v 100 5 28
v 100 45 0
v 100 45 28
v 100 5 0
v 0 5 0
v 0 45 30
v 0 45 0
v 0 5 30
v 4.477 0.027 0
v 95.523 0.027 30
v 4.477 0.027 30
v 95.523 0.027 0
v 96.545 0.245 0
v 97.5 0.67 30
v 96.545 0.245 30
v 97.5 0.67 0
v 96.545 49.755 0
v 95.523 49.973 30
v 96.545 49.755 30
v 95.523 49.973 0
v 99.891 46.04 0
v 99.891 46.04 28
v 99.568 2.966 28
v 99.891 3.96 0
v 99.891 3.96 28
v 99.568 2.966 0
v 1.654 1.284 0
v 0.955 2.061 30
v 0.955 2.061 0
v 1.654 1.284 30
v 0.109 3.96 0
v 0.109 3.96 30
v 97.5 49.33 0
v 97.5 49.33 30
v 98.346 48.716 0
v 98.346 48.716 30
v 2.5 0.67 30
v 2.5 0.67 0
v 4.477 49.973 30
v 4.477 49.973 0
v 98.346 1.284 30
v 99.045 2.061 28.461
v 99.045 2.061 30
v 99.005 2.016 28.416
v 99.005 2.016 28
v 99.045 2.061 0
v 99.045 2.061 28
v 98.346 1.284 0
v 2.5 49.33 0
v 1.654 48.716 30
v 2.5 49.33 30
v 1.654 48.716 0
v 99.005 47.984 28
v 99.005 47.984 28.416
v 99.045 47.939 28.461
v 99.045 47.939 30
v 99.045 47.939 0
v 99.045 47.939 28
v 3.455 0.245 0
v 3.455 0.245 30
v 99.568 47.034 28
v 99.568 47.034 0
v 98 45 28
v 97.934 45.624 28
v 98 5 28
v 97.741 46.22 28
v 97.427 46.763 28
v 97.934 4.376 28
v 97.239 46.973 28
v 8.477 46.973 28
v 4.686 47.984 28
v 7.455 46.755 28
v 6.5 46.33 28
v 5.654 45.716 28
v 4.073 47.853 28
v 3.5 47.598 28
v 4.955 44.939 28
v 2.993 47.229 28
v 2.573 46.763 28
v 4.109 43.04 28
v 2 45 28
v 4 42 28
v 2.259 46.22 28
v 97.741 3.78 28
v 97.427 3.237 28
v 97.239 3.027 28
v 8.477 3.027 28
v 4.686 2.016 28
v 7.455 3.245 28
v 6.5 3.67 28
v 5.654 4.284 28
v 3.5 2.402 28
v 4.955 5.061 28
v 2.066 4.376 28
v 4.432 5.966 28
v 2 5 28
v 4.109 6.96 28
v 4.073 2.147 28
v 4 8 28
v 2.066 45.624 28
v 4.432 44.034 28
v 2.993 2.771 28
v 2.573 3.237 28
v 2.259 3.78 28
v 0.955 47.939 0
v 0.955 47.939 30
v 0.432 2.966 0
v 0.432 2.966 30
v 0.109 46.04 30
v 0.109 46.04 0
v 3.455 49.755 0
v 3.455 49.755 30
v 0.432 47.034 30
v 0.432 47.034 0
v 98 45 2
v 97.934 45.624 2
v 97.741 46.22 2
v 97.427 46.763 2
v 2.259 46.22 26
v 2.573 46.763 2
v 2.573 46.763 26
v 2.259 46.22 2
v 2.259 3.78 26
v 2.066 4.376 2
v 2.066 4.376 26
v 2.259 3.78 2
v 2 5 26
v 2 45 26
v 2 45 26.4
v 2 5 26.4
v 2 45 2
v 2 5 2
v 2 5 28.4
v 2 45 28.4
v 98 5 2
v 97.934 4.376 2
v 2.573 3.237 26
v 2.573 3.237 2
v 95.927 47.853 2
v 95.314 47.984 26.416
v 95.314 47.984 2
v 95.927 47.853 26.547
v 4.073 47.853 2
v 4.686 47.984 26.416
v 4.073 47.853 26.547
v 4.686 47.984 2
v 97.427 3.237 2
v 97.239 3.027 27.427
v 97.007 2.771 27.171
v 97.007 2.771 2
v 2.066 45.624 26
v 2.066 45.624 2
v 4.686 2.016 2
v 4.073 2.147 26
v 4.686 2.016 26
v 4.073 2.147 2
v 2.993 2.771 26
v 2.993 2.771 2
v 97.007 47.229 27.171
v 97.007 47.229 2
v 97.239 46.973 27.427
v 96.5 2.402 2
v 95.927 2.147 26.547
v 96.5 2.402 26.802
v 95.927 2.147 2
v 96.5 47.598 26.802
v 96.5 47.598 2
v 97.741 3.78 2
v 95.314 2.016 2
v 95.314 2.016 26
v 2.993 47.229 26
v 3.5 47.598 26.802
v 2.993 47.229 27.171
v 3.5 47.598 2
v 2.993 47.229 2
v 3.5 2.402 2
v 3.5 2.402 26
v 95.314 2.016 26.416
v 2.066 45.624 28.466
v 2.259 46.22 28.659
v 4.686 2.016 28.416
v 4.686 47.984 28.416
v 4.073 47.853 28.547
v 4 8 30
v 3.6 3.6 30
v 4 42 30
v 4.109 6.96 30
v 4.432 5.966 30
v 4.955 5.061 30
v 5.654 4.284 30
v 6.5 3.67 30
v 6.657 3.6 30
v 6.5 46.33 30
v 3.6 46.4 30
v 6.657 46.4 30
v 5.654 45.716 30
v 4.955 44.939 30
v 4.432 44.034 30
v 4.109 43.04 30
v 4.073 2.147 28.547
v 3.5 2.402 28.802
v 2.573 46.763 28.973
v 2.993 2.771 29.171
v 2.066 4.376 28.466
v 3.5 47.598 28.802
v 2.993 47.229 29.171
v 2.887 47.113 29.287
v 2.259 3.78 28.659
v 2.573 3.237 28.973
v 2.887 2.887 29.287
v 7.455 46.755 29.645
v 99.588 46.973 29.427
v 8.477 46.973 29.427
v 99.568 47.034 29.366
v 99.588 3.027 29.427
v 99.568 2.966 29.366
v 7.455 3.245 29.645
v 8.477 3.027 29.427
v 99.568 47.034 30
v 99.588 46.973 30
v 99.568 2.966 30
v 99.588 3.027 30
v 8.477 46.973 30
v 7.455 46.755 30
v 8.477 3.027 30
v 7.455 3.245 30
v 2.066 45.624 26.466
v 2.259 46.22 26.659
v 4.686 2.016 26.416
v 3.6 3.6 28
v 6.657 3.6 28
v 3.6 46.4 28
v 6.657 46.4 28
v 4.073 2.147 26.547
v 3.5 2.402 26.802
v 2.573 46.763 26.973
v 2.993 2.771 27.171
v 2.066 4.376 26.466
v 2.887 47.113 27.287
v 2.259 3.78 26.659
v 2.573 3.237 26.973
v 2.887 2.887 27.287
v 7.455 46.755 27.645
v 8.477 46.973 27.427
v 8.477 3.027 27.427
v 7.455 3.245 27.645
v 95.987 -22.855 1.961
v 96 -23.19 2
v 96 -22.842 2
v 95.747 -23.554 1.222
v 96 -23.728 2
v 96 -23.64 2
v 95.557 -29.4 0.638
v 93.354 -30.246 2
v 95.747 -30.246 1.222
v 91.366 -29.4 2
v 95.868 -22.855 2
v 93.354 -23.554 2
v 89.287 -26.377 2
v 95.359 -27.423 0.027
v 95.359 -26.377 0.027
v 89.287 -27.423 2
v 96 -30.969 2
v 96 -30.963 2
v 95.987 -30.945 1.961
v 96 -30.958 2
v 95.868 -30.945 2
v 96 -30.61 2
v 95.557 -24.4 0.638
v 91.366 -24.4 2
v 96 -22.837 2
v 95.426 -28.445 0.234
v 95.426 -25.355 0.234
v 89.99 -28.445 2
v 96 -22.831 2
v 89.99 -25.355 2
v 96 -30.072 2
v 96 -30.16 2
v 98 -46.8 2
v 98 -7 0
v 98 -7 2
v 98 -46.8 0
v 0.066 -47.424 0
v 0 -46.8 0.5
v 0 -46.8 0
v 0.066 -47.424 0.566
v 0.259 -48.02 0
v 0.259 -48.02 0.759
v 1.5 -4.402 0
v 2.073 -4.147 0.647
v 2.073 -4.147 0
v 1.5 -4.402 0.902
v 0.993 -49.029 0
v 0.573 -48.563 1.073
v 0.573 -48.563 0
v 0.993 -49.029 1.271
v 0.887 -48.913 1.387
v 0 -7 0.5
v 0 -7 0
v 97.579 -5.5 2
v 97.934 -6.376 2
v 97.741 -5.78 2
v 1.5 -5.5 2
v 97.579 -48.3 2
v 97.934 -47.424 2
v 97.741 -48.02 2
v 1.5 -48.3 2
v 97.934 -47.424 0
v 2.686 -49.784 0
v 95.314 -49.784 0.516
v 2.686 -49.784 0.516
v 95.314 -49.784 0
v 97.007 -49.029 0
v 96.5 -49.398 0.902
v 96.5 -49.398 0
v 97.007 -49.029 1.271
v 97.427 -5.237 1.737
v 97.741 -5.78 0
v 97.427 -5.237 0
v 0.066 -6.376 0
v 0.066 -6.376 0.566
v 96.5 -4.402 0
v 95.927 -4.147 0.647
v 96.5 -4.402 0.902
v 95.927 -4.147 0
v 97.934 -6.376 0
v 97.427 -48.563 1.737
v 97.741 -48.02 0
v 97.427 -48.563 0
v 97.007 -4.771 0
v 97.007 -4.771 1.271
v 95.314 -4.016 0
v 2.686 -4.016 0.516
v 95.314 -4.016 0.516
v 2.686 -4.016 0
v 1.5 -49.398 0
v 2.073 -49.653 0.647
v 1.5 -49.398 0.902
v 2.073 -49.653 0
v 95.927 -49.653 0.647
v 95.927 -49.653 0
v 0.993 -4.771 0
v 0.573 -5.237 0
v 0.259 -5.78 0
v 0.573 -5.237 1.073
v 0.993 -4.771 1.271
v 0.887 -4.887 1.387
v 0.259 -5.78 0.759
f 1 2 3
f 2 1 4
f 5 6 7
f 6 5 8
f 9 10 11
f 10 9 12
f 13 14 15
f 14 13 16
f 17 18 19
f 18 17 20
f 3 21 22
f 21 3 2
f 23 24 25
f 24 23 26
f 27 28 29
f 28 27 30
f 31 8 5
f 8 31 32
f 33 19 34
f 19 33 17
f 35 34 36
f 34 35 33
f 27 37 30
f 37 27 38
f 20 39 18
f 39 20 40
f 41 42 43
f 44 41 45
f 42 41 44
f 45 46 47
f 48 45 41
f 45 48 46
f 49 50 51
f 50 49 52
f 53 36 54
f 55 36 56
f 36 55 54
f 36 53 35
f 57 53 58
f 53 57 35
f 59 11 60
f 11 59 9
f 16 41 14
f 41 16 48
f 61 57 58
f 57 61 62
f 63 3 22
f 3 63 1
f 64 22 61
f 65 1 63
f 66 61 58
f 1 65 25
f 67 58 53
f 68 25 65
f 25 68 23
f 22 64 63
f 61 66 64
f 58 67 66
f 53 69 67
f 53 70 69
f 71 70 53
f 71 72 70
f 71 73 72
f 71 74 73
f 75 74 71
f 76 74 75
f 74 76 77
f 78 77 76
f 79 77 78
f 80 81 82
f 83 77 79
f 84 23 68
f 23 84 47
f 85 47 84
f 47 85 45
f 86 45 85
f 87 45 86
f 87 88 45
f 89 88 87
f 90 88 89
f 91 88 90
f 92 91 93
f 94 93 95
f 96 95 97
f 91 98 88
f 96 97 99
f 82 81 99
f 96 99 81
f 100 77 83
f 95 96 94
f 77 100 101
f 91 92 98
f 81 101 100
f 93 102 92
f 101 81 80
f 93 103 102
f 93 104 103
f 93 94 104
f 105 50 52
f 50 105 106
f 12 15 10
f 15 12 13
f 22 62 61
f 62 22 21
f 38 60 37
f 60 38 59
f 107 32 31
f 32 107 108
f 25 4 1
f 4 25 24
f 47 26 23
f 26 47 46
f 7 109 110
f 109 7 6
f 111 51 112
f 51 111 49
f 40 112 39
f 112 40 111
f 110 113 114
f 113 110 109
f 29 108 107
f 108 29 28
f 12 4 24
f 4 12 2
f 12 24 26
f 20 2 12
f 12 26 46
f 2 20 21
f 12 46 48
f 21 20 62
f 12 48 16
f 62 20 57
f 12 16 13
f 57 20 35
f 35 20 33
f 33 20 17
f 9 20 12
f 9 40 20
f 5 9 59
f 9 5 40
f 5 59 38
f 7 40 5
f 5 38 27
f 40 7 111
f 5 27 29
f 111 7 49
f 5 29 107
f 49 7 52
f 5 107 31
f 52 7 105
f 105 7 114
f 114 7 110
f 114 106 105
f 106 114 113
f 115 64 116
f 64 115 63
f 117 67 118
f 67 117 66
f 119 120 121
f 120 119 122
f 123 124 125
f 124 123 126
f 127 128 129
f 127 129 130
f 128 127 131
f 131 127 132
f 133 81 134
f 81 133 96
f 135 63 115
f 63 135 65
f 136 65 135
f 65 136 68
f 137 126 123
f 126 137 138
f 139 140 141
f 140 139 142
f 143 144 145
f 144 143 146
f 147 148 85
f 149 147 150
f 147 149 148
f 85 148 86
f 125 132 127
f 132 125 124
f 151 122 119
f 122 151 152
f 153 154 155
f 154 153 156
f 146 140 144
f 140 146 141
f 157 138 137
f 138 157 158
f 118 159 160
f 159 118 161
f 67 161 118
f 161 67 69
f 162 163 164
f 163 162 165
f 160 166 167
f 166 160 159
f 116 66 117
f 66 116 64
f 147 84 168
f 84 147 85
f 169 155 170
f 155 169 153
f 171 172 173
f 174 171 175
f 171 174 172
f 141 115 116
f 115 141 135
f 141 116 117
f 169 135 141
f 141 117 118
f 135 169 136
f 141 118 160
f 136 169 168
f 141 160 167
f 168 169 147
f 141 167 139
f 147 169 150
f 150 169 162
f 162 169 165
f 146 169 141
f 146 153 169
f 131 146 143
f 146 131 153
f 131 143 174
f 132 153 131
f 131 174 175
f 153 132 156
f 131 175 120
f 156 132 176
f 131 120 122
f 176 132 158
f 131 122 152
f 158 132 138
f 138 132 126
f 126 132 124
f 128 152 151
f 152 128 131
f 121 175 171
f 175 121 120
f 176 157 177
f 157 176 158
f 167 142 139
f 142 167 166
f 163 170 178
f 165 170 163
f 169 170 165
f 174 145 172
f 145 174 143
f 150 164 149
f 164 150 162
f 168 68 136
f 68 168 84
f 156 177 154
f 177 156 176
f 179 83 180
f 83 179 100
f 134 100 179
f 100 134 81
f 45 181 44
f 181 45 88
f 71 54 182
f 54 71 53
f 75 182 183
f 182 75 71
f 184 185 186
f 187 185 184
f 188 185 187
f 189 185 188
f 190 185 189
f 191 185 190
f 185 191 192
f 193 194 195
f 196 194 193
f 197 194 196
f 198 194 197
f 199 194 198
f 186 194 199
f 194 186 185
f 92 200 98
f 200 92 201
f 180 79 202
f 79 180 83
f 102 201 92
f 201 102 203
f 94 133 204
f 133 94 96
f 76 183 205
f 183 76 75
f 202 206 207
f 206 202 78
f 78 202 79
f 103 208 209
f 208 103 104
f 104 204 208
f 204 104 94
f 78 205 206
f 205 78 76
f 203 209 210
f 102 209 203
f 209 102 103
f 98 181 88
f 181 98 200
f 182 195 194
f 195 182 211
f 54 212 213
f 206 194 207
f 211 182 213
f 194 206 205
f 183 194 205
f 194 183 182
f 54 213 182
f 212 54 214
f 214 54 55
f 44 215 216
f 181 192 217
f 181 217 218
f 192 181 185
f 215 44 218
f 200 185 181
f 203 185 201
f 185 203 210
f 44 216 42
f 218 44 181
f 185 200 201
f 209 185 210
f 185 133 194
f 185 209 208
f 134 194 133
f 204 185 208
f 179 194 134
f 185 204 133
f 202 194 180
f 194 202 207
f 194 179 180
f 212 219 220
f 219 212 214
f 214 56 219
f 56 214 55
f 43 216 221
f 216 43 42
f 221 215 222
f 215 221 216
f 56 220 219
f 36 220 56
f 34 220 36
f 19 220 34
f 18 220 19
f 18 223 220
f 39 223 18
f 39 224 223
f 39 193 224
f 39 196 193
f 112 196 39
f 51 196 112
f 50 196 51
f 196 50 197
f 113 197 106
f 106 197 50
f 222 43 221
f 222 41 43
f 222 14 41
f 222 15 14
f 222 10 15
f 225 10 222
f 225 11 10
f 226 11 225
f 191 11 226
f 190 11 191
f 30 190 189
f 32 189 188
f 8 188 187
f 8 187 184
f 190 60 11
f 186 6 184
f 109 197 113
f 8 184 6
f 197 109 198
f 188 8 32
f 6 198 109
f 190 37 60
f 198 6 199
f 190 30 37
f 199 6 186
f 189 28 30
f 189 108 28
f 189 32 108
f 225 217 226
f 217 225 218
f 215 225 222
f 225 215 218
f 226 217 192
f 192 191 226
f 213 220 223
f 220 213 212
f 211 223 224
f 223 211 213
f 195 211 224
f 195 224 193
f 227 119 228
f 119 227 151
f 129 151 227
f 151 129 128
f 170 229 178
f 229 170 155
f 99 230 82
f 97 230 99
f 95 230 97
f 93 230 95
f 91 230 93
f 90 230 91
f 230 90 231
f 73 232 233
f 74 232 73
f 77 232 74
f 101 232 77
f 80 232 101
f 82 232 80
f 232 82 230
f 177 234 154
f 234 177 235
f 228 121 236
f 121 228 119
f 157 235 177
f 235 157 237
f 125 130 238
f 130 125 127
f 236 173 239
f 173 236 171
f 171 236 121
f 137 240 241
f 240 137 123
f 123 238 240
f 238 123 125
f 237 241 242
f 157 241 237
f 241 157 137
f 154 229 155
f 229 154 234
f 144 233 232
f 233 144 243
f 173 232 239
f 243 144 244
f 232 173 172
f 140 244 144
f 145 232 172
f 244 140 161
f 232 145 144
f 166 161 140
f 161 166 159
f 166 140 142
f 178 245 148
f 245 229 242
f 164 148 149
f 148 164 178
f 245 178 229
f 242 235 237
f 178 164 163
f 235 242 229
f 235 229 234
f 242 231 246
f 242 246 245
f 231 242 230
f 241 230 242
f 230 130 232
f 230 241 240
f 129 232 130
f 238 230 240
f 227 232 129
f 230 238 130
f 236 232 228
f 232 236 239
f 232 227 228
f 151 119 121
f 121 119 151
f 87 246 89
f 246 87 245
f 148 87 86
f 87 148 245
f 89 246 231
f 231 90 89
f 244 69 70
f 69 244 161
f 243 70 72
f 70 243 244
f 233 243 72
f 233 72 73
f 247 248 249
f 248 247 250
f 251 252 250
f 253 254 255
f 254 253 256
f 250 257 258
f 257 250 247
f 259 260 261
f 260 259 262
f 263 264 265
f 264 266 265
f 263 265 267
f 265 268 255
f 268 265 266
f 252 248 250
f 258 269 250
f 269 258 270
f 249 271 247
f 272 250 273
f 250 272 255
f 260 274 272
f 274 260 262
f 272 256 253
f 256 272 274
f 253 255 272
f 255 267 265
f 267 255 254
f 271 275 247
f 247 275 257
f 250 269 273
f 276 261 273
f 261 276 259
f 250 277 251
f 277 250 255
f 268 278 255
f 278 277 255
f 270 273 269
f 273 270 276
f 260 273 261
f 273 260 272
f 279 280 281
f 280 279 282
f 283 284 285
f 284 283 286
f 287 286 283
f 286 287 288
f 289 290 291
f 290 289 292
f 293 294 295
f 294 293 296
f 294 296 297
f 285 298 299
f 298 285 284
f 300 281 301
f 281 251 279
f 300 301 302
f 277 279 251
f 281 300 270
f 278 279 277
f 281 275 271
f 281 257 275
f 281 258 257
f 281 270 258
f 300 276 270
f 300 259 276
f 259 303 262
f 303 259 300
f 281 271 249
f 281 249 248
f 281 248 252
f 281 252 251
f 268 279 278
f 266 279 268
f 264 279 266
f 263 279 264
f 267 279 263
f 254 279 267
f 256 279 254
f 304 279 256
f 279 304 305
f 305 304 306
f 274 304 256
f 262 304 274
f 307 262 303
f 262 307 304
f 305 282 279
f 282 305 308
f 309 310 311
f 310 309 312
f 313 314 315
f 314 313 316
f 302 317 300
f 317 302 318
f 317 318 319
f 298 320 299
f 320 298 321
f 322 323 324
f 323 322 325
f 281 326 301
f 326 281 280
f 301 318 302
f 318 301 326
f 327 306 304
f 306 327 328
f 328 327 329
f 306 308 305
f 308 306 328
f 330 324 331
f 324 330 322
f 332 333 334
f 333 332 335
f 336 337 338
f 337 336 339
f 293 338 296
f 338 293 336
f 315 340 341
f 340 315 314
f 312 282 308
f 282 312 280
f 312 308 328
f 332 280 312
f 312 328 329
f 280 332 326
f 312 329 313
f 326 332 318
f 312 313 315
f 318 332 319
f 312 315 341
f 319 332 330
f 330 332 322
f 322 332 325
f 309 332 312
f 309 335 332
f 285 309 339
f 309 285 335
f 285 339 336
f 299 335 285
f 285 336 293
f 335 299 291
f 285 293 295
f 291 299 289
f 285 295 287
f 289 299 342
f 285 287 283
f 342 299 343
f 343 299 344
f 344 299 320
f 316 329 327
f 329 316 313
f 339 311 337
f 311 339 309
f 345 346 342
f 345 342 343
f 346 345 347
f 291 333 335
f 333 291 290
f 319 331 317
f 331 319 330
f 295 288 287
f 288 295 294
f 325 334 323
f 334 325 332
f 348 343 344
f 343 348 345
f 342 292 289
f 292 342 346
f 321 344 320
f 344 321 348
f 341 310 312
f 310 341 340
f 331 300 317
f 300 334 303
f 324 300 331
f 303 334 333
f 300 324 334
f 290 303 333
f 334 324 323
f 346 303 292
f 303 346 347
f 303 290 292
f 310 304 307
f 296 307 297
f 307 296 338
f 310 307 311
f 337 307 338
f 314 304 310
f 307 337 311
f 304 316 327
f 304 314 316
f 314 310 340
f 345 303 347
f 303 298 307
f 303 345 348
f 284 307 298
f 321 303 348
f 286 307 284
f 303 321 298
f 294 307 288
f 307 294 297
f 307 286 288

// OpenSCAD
itemsShown="both"; // [both,box,lid]
boxLength=100;
boxWidth=50;
boxHeight=30;
cornerRadius=5;
wallThickness=2;
bottomThickness=2;
lidThickness=2;
lidClearance=0.2;
lidEdgeThickness=0.5;
horizontalDividers = 1; //[1:10]
verticalDividers = 1; //[1:10]
// Notch in the lid
withNotch=true;//true;//[true:false]

/* [Global] */
if (itemsShown=="box") showBox();
if (itemsShown=="lid") showLid();
if (itemsShown=="both"){showBox();showLid();}

module showLid(){
	translate ([0, -2*wallThickness, 0]) 
	roundBoxLid(l=boxLength-wallThickness,
				w=boxWidth-2*wallThickness-lidClearance,
				h=lidThickness,
				et=lidEdgeThickness,
				r=cornerRadius-wallThickness,
				notch=withNotch);
}

module showBox(){
	round_box(l=boxLength,
			  w=boxWidth,
			  h=boxHeight,
			  bt=bottomThickness,
			  wt=wallThickness,
			  lt=lidThickness,
			  r=cornerRadius,
              hd=horizontalDividers,
              vd=verticalDividers);
}

module round_box(l=40,w=30,h=30,bt=2,wt=2,lt=2,r=5,hd=1,vd=1){
	difference() { 
		round_cube(l=l,w=w,h=h-lt,r=r);
		translate ([wt, wt, bt]) 
		round_cube(l=l-wt*2,w=w-wt*2,h=h,r=r-wt);
	}
    
    
	//use two box rims. one to make a slope to support the lid
	roundBoxRim();
	translate ([0, 0, -wt]) roundBoxRim();
}

module roundBoxRim(l=boxLength,
				   w=boxWidth,
				   h=boxHeight,
				   et=lidEdgeThickness,
				   r=cornerRadius,
				   wt=wallThickness,
				   lt=lidThickness){
	difference() { 
		translate ([0, 0, h-lt]) 
		round_cube(l=l,w=w,h=lt,r=r);
		translate ([wt+lt,wt+lt-et*2,h-lt-0.1]) 
		round_cube(l=l*2,w=w-2*(wt+lt)+4*et,h=lt+0.2,r=r-wt+lt);

		//subtract out a lid to make the ledge
		translate ([wt, w-wt, h-lt-0.1])
		roundBoxLid(l=l*2,w=w-2*wt,h=lt+0.1,wt=wt,t=lt,et=0.5,r=r-wt,notch=false);
	}
}

module roundBoxLid(l=40,w=30,h=3,wt=2,t=2,et=0.5,r=5,notch=true){
	translate ([l, 0, 0]) 
	rotate (a = [0, 0, 180]) 
	difference(){
		round_cube(l=l,w=w,h=h,t=t,r=r);

		translate ([-1, 0, et]) rotate (a = [45, 0, 0])  cube (size = [l+2, h*2, h*2]); 
		translate ([-1, w, et]) rotate (a = [45, 0, 0])  cube (size = [l+2, h*2, h*2]); 
		translate ([l, -1, et]) rotate (a = [45, 0, 90]) cube (size = [w+2, h*2, h*2]); 
		if (notch==true){
			translate([2,w/2,h+0.001]) thumbNotch(10/2,72,t);
		}
	}
}

module thumbNotch(
	thumbR=12/2,
	angle=72,
	notchHeight=2){

	size=10*thumbR;

	rotate([0,0,90])
	difference(){
		translate([0,
					(thumbR*sin(angle)-notchHeight)/tan(angle),
					 thumbR*sin(angle)-notchHeight])
		rotate([angle,0,0])
		cylinder(r=thumbR,h=size,$fn=30);

		translate([-size,-size,0])
		cube(size*2);
	}
}

module round_cube(l=40,w=30,h=20,r=5,$fn=30){
	hull(){ 
		translate ([r, r, 0]) cylinder (h = h, r=r);
		translate ([r, w-r, 0]) cylinder (h = h, r=r);
		translate ([l-r,w-r, 0]) cylinder (h = h, r=r);
		translate ([l-r, r, 0]) cylinder (h = h, r=r);
	}
}
